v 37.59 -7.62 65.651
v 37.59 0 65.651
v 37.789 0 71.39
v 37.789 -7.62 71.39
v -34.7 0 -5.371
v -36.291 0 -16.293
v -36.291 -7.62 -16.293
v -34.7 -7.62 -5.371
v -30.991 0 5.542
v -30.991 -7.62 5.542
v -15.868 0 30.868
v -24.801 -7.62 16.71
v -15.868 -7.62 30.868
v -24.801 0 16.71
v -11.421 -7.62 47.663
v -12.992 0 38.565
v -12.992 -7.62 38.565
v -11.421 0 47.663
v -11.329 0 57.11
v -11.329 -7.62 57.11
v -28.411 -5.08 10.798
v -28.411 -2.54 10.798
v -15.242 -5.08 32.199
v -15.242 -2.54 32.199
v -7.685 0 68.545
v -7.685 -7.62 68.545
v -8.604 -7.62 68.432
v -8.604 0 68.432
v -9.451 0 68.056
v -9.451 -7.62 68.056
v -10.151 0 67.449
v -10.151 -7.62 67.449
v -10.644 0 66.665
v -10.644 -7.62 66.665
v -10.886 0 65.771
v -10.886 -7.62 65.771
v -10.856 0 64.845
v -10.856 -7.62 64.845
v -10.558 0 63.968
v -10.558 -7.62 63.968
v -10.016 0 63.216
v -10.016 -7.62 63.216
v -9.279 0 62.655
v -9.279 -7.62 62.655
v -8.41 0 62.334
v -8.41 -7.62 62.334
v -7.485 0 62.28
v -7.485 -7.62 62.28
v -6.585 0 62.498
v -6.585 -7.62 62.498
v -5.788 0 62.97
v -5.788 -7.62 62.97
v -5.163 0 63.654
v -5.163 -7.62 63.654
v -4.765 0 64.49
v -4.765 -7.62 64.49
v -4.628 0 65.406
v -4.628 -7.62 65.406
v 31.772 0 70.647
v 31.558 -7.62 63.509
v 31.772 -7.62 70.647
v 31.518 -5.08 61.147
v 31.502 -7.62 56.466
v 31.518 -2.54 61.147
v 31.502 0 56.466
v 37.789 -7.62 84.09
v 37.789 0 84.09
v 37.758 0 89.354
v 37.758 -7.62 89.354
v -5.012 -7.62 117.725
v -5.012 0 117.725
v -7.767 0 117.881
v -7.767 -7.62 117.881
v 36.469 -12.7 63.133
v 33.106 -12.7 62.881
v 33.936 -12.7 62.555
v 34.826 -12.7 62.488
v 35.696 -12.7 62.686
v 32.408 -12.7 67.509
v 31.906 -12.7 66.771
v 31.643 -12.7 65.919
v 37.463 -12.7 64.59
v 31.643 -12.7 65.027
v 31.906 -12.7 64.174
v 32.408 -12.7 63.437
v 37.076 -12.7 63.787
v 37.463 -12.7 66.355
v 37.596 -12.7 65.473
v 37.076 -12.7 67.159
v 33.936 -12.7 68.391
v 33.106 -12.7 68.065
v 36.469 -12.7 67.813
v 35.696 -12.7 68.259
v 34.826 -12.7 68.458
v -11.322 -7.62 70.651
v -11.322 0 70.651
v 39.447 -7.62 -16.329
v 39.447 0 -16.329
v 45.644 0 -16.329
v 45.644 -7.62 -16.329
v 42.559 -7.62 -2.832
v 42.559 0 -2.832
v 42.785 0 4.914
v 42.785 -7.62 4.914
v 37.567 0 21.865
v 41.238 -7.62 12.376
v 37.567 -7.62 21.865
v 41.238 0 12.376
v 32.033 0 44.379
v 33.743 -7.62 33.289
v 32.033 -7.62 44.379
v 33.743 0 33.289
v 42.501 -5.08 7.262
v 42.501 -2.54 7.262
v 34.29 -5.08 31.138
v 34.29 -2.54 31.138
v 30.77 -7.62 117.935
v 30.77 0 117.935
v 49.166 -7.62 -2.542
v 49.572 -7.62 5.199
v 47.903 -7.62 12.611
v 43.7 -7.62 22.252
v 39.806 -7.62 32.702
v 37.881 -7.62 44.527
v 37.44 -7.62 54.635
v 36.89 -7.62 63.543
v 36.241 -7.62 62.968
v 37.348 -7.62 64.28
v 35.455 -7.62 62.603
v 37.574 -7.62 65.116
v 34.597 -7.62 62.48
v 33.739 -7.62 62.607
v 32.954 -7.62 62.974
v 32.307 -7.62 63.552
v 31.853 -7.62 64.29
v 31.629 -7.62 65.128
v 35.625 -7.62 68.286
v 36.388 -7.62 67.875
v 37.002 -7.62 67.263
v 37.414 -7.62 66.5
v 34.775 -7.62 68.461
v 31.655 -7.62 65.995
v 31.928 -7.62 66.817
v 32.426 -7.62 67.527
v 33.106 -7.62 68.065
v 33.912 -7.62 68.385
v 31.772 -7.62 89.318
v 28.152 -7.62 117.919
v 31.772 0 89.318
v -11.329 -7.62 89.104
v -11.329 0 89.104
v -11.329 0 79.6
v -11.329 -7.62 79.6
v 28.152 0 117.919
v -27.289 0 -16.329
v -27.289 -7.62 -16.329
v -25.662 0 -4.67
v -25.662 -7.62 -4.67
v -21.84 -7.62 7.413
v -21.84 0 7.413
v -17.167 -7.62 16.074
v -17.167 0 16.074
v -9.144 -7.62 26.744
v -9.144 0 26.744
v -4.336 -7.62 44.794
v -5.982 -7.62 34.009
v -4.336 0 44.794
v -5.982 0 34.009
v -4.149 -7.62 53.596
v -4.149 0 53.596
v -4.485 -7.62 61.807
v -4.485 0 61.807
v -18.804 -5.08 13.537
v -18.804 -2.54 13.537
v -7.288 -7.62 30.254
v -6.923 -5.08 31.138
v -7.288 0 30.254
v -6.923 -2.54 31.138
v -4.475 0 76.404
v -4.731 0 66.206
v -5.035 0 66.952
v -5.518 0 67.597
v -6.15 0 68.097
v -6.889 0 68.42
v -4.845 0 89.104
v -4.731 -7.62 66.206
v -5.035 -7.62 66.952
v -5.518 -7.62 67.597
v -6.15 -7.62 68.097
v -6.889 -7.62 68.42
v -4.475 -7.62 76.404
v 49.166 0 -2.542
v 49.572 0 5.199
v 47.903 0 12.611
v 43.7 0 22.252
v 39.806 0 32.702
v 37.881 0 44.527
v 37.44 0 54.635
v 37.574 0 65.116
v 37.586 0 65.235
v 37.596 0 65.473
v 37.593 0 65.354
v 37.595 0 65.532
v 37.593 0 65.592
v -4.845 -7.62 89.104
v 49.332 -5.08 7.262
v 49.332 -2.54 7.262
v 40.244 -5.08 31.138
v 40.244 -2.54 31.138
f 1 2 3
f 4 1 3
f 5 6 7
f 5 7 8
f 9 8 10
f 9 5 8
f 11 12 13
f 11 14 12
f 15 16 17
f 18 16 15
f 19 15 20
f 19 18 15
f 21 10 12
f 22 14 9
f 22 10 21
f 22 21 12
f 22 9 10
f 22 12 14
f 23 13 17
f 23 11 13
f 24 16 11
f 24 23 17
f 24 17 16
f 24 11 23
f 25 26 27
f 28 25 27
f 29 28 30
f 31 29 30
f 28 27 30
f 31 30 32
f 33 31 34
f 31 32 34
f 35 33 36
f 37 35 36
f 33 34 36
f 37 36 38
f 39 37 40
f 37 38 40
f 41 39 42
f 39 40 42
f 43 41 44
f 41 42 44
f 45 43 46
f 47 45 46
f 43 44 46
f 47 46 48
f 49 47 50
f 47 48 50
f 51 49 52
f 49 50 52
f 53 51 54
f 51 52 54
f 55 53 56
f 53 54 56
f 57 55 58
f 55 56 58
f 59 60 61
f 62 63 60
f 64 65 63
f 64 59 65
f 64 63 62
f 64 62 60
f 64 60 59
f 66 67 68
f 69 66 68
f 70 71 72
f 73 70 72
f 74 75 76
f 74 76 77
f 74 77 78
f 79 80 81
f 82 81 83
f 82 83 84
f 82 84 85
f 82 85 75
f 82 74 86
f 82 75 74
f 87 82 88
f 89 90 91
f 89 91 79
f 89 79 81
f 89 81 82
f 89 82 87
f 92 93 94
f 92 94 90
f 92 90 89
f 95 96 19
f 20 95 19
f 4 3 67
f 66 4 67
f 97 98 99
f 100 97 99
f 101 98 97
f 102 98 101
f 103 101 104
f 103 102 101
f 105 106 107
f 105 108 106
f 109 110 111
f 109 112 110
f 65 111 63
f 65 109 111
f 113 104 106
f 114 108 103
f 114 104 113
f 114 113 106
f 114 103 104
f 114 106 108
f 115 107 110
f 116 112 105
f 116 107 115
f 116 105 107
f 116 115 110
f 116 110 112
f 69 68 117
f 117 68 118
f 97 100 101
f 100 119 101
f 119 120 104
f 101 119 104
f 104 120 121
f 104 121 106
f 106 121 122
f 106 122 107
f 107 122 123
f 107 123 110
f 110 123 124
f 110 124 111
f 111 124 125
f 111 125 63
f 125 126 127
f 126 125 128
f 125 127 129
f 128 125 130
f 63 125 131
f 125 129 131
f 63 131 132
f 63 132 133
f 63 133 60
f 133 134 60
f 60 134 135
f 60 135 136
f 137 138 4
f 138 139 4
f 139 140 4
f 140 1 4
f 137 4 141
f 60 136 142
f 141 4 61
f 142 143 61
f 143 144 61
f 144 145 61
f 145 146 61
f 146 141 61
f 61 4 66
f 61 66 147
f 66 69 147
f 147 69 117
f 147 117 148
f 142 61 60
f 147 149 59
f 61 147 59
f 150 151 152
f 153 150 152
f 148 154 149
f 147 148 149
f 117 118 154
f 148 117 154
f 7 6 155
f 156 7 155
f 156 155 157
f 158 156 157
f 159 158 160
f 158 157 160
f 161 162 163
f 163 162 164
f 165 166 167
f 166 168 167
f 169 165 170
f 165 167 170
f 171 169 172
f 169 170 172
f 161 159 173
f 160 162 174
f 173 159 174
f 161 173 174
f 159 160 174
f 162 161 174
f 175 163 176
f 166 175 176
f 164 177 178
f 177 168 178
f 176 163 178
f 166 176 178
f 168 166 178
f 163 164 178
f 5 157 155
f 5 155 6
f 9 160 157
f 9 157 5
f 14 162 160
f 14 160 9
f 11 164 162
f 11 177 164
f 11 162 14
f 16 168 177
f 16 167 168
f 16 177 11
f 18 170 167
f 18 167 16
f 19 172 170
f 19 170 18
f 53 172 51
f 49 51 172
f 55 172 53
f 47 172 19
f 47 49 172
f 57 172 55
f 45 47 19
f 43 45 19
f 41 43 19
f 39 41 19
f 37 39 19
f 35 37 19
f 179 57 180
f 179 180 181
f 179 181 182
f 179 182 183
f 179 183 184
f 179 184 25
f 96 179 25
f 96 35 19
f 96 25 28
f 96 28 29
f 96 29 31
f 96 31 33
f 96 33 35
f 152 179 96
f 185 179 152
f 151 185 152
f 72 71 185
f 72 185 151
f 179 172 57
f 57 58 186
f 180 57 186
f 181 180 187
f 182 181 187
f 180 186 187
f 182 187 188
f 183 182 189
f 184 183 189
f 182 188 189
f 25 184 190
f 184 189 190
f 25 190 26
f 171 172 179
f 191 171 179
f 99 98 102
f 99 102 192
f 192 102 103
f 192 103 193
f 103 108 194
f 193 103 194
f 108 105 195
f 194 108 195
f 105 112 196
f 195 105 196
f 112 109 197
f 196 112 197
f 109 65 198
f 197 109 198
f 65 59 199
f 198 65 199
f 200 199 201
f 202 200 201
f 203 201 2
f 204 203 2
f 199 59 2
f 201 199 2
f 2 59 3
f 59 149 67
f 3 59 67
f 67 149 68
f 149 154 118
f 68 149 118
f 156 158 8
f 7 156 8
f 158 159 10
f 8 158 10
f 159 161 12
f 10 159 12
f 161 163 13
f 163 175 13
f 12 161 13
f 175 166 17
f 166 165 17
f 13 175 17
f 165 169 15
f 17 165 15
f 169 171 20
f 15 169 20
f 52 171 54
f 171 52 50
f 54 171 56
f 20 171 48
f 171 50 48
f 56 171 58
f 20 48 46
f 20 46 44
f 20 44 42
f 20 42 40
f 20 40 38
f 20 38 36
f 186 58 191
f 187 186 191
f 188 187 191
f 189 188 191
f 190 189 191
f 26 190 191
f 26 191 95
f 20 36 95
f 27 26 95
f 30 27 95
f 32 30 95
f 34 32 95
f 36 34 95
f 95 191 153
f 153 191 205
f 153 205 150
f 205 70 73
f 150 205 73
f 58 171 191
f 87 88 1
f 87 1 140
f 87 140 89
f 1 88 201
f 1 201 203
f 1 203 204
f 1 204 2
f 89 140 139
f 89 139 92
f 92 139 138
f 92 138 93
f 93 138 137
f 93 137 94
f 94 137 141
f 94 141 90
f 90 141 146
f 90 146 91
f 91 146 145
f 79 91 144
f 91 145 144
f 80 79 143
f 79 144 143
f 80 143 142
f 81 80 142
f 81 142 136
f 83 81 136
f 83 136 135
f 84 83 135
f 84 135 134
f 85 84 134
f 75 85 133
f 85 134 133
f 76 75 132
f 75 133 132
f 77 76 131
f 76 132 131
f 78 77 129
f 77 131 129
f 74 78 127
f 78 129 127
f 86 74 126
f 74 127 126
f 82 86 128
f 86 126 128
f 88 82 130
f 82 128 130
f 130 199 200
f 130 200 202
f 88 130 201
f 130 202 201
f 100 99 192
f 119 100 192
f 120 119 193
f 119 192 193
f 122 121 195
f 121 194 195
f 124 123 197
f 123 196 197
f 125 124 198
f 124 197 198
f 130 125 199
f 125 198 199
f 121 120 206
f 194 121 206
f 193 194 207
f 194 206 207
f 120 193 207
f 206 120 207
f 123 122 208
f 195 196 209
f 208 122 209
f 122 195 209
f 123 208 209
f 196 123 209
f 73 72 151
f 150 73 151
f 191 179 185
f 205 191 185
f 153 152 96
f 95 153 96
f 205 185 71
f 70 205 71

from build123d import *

# Parameters (mm, degrees)
F1_DEPTH = 7.62
F2_DEPTH = 7.62
F3_R     = 2.9931989814
F5_DEPTH = 12.7
F3_R_2   = 3.7293138993
F6_DEPTH = 25.4
F8_DEPTH = 25.4


# Not quite as in the source:
# - the program builds the solid bodies; features that only make, move or delete a surface that nothing else refers to are left out


with BuildPart() as f1:
    # F0 (on Front) → F1 (new body)
    with BuildSketch(Plane.XZ):
        with BuildLine():
            add(Edge.make_bspline(
                [(39.446875453, -16.3293741643), (41.9001167123, -8.2704796171), (45.5947084864, 8.0337070769), (33.0409793146, 28.1137801453), (31.5653655238, 47.3073931738), (31.5021629172, 56.4661241863)],
                knots=[0, 0, 0, 0, 0.3011805087, 0.61146441, 0.8692310246, 0.8692310246, 0.8692310246, 0.8692310246], degree=3))
            Line((39.446875453, -16.3293741643), (45.644475453, -16.3293741643))
            add(Edge.make_bspline(
                [(45.644475453, -16.3293741643), (48.0836032329, -8.303541327), (53.0592723839, 8.1631929353), (36.5013753886, 30.9253527959), (37.2587382897, 57.1631543308), (37.7889908314, 71.3900855683)],
                knots=[0, 0, 0, 0, 0.2999480229, 0.6102007791, 1, 1, 1, 1], degree=3))
            Line((37.7889908314, 71.3900855683), (37.7889908314, 84.0900855683))
            Line((37.7889908314, 84.0900855683), (37.7582089288, 89.353502548))
            Line((37.7582089288, 89.353502548), (30.7703027195, 117.9347286346))
            Line((30.7703027195, 117.9347286346), (28.1520184027, 117.9194161915))
            Line((28.1520184027, 117.9194161915), (31.7724533379, 89.3184962116))
            Line((31.7724533379, 89.3184962116), (31.7724533379, 83.3474483013))
            Line((31.7724533379, 83.3474483013), (31.7724533379, 70.6474483013))
            add(Edge.make_bspline(
                [(31.5021629172, 56.4661241863), (31.470099261, 61.1124895525), (31.5941022469, 65.8744563999), (31.7724533379, 70.6474483013)],
                knots=[0.8692310246, 0.8692310246, 0.8692310246, 0.8692310246, 1, 1, 1, 1], degree=3))
        make_face()
    extrude(amount=F1_DEPTH)

    # F3 (on Front) → F5 (join)
    with BuildSketch(Plane.XZ):
        with Locations((34.6025004983, 65.4727444053)):
            Circle(F3_R)
    extrude(amount=F5_DEPTH)

    # F3 (on Front) → F6 (cut)
    with BuildSketch(Plane.XZ):
        with Locations((-7.5630368665, 65.4727444053)):
            Circle(F3_R_2)
    extrude(amount=-F6_DEPTH, mode=Mode.SUBTRACT)


with BuildPart() as f2:
    # F0 (on Front) → F2 (new body)
    with BuildSketch(Plane.XZ):
        with BuildLine():
            add(Edge.make_bspline(
                [(-36.291336976, -16.2931783742), (-35.9797269437, -7.4434377304), (-30.0480350171, 12.015348302), (-13.0050265683, 30.9384280949), (-10.7868187806, 48.4065419002), (-11.3293034956, 57.1104250848)],
                knots=[0, 0, 0, 0, 0.3461239889, 0.6727746853, 1, 1, 1, 1], degree=3))
            Line((-36.291336976, -16.2931783742), (-27.2889714688, -16.3293741643))
            add(Edge.make_bspline(
                [(-27.2889714688, -16.3293741643), (-26.9699991675, -7.2705447074), (-20.9702017655, 15.7077591395), (-3.4595302989, 28.7919953348), (-3.9001260053, 52.4256435308), (-4.4848158276, 61.8066855623)],
                knots=[0, 0, 0, 0, 0.3543017036, 0.6473166786, 1, 1, 1, 1], degree=3))
            Line((-4.4848158276, 61.8066855623), (-4.4748519132, 76.4043473555))
            Line((-4.4748519132, 76.4043473555), (-4.8449948946, 89.1043473555))
            Line((-4.8449948946, 89.1043473555), (-5.0123790024, 117.7254617214))
            Line((-5.0123790024, 117.7254617214), (-7.7673349517, 117.8813783243))
            Line((-7.7673349517, 117.8813783243), (-11.3293034956, 89.1043473555))
            Line((-11.3293034956, 89.1043473555), (-11.3293034956, 85.981985124))
            Line((-11.3293034956, 85.981985124), (-11.3293034956, 79.6000332555))
            Line((-11.3293034956, 79.6000332555), (-11.3221835393, 70.6508324852))
            Line((-11.3221835393, 70.6508324852), (-11.3293034956, 57.1104250848))
        make_face()
    extrude(amount=F2_DEPTH)

    # F7 (on face) → F8 (cut)
    with BuildSketch(Plane.XZ.offset(7.62)):
        with BuildLine():
            ThreePointArc((-7.6848294678, 68.5448205068), (-10.0162462779, 63.2158830381), (-4.627879267, 65.4064491391))
            ThreePointArc((-4.627879267, 65.4064491391), (-5.5184236255, 67.5970152401), (-7.6848294678, 68.5448205068))
        make_face()
    extrude(amount=-F8_DEPTH, mode=Mode.SUBTRACT)


solid = Compound([f1.part, f2.part])
